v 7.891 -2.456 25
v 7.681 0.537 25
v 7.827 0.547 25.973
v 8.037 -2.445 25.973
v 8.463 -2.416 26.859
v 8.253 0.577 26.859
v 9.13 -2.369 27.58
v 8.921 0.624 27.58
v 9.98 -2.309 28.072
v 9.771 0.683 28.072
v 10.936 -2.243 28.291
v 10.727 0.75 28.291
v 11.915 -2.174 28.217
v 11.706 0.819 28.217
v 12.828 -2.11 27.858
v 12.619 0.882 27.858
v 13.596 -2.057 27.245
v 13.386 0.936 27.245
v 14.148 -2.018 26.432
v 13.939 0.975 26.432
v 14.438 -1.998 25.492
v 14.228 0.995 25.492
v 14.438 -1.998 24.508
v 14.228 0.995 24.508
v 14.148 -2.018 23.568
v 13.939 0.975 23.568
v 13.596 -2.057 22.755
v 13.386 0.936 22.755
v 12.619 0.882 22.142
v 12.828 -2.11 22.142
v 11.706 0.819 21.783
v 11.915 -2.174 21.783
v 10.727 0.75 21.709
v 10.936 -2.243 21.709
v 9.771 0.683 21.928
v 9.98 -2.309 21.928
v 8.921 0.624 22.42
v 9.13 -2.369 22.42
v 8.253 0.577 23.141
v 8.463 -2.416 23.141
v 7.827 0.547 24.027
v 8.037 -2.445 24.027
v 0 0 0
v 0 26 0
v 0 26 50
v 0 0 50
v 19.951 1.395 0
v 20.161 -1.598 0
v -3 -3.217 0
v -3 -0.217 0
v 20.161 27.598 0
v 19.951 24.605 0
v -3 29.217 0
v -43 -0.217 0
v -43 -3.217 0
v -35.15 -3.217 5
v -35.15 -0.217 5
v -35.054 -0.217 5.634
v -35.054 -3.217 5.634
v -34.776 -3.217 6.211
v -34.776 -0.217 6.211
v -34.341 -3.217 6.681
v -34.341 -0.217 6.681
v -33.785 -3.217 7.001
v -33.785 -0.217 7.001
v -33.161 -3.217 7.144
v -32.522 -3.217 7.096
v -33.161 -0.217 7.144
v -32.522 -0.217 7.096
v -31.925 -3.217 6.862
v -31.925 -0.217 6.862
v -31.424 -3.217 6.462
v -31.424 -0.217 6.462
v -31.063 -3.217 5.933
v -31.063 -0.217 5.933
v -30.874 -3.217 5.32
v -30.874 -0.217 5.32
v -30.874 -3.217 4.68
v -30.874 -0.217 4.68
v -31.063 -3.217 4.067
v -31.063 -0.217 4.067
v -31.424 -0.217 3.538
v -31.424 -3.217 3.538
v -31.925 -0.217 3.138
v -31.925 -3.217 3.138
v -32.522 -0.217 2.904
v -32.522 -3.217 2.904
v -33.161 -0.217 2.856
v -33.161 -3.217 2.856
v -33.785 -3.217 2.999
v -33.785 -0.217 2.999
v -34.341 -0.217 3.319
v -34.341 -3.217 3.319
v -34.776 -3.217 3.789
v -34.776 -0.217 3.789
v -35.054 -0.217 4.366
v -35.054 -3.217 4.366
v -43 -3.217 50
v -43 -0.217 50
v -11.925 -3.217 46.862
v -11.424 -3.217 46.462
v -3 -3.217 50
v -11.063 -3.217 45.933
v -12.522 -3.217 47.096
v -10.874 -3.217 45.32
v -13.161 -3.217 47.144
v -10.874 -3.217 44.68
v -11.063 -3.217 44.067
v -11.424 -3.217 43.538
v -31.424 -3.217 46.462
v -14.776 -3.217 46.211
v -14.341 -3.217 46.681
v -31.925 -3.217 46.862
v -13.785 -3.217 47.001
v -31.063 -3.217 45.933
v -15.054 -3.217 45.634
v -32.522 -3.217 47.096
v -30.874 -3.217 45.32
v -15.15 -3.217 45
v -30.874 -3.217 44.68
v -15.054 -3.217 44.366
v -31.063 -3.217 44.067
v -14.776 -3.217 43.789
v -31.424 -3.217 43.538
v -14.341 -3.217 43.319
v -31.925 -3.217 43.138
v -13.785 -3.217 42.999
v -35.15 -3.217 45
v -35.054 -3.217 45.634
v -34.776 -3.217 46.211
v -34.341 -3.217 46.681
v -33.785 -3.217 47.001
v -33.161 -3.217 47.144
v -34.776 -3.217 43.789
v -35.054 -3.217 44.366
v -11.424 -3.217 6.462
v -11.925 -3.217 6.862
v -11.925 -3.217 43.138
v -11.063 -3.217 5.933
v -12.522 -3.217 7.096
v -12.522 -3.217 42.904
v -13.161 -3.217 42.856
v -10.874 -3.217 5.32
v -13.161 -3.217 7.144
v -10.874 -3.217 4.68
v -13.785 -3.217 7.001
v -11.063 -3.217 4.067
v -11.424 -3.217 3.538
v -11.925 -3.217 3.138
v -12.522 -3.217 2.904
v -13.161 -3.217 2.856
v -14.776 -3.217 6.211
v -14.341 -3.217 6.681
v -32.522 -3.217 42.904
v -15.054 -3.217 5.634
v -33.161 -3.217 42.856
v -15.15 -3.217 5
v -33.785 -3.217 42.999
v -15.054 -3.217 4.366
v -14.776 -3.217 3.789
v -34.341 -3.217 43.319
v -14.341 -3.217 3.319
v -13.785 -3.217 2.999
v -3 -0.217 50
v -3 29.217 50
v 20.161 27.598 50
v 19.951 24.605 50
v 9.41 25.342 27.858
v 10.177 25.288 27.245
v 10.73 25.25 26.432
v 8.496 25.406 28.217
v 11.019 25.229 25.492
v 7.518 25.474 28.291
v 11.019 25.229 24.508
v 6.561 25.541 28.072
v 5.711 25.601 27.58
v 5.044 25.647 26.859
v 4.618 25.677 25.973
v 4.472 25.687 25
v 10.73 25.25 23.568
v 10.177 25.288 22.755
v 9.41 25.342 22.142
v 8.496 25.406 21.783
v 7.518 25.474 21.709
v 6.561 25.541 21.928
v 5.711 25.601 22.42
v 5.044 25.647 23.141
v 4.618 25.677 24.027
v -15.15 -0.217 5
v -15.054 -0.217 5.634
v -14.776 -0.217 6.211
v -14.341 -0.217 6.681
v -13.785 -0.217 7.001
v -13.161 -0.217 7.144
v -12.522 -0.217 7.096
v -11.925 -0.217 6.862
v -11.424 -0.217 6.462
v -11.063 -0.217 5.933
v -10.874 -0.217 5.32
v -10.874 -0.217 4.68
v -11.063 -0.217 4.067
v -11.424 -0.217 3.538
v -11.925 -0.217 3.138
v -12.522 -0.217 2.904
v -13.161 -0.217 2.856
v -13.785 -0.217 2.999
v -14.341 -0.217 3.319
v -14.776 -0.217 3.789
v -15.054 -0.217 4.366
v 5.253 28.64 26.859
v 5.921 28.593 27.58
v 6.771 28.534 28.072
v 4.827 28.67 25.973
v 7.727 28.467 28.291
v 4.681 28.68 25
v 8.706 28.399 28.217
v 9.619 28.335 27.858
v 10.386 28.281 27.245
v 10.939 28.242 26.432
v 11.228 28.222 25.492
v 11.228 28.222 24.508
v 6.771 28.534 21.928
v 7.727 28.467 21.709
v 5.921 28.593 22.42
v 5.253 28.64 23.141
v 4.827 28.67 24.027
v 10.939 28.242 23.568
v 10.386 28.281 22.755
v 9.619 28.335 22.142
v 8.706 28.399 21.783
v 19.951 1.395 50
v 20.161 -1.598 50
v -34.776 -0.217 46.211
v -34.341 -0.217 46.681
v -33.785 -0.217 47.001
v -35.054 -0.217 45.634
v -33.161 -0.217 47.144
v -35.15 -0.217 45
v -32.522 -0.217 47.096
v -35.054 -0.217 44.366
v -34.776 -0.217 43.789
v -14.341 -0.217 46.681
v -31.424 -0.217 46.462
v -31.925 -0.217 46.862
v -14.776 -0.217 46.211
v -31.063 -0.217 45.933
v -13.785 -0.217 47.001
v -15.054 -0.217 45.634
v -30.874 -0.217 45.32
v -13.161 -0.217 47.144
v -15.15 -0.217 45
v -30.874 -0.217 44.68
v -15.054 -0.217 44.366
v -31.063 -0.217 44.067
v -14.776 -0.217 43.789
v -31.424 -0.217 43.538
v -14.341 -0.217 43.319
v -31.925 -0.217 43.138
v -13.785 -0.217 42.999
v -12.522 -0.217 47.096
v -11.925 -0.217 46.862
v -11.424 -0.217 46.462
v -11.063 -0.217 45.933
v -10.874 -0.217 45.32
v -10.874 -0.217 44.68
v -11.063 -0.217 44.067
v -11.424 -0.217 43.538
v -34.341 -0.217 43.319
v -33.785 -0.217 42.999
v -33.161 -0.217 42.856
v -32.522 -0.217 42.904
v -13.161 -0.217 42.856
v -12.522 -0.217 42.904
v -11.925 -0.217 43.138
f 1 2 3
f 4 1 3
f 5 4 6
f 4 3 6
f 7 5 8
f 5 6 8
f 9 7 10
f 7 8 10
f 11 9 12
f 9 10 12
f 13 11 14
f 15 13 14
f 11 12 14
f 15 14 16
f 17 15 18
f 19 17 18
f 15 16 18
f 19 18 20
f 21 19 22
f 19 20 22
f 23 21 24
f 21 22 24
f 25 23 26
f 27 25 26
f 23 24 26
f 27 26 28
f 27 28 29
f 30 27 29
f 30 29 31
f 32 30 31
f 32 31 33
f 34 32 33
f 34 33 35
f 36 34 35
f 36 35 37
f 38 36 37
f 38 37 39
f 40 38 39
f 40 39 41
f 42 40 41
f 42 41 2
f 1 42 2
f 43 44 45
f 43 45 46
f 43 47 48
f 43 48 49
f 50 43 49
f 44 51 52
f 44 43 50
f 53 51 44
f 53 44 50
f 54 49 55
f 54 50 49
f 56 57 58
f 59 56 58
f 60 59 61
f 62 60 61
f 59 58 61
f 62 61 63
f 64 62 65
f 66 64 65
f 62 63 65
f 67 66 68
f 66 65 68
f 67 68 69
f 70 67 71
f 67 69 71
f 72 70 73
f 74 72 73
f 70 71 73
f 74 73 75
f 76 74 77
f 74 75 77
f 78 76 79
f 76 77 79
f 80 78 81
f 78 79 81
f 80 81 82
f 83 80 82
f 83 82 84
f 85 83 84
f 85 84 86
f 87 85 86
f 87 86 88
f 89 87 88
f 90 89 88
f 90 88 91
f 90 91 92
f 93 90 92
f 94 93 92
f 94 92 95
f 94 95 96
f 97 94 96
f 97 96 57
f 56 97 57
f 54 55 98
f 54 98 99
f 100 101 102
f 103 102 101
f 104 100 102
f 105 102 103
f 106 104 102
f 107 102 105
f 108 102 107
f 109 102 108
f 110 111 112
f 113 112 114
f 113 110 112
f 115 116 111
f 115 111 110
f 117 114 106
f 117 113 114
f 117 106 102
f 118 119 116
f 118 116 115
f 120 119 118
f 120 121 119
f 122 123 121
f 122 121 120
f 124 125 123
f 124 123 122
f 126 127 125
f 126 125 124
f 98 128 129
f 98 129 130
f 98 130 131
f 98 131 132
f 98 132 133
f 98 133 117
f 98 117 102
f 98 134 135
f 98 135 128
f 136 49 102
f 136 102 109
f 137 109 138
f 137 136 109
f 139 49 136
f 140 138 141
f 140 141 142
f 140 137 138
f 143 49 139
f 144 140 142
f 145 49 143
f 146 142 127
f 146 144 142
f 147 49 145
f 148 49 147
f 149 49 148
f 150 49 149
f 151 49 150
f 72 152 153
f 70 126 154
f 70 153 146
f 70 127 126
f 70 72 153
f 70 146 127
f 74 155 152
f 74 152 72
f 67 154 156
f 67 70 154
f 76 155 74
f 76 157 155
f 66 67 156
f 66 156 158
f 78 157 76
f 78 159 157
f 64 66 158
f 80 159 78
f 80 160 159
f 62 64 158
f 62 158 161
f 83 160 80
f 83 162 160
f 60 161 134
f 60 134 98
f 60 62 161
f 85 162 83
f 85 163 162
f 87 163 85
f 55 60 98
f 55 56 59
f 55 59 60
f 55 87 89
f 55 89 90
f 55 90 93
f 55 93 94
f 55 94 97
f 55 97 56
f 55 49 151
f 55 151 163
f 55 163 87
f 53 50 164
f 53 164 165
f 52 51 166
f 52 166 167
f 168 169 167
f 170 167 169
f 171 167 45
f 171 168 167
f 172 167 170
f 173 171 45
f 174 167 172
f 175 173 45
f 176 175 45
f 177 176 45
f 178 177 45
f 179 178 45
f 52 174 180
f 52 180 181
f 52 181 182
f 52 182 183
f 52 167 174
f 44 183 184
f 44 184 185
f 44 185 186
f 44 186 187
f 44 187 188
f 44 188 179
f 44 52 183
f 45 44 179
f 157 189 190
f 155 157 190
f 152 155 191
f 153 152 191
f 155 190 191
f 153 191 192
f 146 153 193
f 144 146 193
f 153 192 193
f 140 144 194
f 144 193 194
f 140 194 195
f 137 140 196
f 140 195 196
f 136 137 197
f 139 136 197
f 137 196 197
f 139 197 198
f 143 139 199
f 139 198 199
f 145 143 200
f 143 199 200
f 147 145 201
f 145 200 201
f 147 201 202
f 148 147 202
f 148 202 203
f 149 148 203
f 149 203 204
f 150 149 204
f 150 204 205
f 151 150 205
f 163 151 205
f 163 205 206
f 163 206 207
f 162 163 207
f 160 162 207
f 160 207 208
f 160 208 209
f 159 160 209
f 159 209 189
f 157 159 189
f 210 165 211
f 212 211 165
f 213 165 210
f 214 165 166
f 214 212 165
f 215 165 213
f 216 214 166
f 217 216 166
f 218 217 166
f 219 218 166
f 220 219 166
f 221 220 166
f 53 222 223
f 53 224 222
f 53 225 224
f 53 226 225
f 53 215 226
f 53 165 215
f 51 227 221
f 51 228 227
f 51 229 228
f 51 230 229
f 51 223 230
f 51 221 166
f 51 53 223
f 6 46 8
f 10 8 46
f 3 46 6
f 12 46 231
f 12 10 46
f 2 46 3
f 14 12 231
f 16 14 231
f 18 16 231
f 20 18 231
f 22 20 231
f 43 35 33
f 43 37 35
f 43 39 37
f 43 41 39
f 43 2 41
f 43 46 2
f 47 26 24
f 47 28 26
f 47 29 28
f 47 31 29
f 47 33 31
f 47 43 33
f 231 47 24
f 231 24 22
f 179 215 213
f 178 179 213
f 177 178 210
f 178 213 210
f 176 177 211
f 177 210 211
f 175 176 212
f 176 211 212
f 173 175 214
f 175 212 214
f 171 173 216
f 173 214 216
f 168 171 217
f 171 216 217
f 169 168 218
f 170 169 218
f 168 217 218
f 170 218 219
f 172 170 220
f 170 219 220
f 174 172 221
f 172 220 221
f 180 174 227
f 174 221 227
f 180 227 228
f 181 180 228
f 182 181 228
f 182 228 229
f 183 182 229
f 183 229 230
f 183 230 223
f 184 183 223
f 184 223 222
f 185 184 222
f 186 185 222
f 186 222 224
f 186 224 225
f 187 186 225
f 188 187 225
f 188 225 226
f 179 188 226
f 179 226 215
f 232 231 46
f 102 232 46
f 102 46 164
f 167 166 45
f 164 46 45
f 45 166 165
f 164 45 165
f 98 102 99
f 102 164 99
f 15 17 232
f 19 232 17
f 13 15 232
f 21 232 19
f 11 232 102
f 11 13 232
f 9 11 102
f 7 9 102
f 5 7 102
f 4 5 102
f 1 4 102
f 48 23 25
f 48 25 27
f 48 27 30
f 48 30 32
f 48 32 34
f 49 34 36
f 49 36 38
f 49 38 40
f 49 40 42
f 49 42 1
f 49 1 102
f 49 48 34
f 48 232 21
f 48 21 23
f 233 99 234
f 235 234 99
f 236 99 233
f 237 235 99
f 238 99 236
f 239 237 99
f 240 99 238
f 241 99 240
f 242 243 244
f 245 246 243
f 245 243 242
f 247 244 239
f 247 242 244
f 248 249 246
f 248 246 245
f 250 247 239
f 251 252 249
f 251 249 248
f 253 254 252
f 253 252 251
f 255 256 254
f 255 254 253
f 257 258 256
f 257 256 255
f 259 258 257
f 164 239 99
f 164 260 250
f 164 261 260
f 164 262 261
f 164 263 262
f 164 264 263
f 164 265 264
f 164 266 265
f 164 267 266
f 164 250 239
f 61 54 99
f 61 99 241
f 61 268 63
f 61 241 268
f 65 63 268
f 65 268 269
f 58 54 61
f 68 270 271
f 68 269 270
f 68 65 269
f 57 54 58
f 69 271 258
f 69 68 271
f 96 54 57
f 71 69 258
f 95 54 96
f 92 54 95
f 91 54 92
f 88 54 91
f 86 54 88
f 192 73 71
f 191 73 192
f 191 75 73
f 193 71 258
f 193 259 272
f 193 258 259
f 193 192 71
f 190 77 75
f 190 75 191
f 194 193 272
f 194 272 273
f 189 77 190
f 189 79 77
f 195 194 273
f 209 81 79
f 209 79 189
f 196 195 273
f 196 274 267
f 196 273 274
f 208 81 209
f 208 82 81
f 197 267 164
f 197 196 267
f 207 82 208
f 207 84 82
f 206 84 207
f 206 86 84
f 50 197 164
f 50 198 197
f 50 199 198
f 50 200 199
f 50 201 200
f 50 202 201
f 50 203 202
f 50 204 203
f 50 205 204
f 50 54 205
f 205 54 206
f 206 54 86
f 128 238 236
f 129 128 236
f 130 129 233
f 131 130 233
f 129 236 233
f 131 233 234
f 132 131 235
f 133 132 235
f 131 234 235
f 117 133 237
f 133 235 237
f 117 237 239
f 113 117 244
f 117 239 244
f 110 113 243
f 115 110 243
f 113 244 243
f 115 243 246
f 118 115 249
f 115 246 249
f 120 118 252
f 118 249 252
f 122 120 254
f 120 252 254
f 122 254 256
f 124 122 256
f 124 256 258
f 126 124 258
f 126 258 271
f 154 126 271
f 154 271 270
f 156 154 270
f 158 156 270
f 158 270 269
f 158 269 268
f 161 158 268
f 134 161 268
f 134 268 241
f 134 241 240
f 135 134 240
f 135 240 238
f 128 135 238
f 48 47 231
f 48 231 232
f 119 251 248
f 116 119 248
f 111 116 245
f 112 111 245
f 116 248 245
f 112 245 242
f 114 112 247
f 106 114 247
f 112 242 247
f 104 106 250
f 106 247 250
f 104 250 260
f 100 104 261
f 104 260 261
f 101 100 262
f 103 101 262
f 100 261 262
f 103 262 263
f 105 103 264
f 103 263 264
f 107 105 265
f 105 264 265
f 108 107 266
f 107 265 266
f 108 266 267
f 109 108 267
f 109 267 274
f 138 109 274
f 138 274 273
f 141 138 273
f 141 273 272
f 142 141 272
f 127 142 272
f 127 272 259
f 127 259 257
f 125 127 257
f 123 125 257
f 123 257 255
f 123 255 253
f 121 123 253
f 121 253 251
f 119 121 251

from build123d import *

# Parameters (mm, degrees)
PAD_DEPTH       = 50
SKETCH001_R     = 2.15
POCKET_DEPTH    = 5
SKETCH002_R     = 3.3
POCKET001_DEPTH = 5
SKETCH003_R     = 3.3
POCKET002_DEPTH = 5


with BuildPart() as part:
    # Sketch → Pad (new body)
    with BuildSketch(Plane.XY):
        Polygon((0, 26), (0, 0), (19.9512810052, 1.3951294749), (20.1605504264, -1.5975626759), (-3, -3.2171061301), (-43, -3.2171061301), (-43, -0.2171061301), (-3, -0.2171061301), (-3, 29.2171061301), (20.1605504264, 27.5975626759), (19.9512810052, 24.6048705251), align=None)
    extrude(amount=PAD_DEPTH)

    # Sketch001 (on Face7 of Pad) → Pocket (cut)
    with BuildSketch(Plane(origin=(0, -0.2171061301, 0), x_dir=(-1, 0, 0), z_dir=(0, 1, 0))):
        with Locations((13, 45)):
            Circle(SKETCH001_R)
        with Locations((33, 45)):
            Circle(SKETCH001_R)
        with Locations((13, 5)):
            Circle(SKETCH001_R)
        with Locations((33, 5)):
            Circle(SKETCH001_R)
    extrude(amount=-POCKET_DEPTH, mode=Mode.SUBTRACT)

    # Sketch002 (on Face13 of Pocket) → Pocket001 (cut)
    with BuildSketch(Plane(origin=(2.0185197337, 28.8661770444, 0), x_dir=(-0.9975640503, 0.0697564737, 0), z_dir=(0.0697564737, 0.9975640503, 0))):
        with Locations((-5.9692255526, 25)):
            Circle(SKETCH002_R)
    extrude(amount=-POCKET001_DEPTH, mode=Mode.SUBTRACT)

    # Sketch003 (on Face3 of Pocket001) → Pocket002 (cut)
    with BuildSketch(Plane(origin=(0, 0, 0), x_dir=(-0.9975640503, -0.0697564737, 0), z_dir=(-0.0697564737, 0.9975640503, 0))):
        with Locations((-11, 25)):
            Circle(SKETCH003_R)
    extrude(amount=-POCKET002_DEPTH, mode=Mode.SUBTRACT)


solid = part.part
